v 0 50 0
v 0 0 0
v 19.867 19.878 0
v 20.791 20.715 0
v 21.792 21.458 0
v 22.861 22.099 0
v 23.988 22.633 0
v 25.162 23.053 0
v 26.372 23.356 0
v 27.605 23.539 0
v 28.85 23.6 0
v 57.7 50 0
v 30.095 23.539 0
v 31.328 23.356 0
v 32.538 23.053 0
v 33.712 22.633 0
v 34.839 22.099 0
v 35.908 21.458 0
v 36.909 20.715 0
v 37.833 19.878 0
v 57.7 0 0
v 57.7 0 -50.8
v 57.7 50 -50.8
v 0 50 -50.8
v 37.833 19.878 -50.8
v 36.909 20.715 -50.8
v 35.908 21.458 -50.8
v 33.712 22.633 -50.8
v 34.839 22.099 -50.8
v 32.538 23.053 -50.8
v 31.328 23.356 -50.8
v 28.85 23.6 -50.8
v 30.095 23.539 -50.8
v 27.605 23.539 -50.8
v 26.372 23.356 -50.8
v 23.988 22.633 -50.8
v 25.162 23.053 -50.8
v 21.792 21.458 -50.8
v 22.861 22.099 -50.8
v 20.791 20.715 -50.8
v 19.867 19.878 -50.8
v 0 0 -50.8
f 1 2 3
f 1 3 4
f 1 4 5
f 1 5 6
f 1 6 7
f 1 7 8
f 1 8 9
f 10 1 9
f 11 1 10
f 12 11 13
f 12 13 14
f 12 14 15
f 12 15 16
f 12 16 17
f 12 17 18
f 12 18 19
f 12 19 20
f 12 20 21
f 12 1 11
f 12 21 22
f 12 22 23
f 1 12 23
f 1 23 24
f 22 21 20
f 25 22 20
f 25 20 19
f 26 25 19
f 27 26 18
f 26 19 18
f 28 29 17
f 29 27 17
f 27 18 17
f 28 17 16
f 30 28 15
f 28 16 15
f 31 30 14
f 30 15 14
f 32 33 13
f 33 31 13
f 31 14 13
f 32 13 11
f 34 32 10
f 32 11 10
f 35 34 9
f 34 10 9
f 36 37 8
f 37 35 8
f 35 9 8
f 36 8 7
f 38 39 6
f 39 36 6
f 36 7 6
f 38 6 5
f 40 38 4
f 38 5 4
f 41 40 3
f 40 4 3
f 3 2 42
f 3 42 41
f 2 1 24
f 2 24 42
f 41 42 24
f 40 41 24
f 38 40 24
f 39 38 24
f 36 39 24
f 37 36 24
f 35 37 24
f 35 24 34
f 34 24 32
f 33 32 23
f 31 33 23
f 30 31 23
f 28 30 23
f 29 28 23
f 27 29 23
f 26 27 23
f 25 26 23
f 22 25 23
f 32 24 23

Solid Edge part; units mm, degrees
sketch "Sketch1" plane through (0, 0, 0) normal (0, 0, 1) x (1, 0, 0)
  line L0 (0, 0) -> (57.7, 0)
  line L1 (57.7, 0) -> (57.7, 50)
  line L2 (57.7, 50) -> (0, 50)
  line L3 (0, 50) -> (0, 0)
extrude "Protrusion1" add sketch "Sketch1" against normal blind 50.8
sketch "Sketch2" plane through (28.85, 25, 0) normal (0, 0, 1) x (0, 1, 0)
  line L0 (-25, 28.85) -> (-5.1221, 8.9826)
  arc A0 (-5.1221, 8.9826) -> (-5.1221, -8.9826) centre (-14.1, 0) cw
  line L1 (-25, -28.85) -> (-5.1221, -8.9826)
  line L2 (-25, 28.85) -> (-25, -28.85)
extrude "Recorte_Extrudado_1" cut sketch "Sketch2" against normal blind 50.8
